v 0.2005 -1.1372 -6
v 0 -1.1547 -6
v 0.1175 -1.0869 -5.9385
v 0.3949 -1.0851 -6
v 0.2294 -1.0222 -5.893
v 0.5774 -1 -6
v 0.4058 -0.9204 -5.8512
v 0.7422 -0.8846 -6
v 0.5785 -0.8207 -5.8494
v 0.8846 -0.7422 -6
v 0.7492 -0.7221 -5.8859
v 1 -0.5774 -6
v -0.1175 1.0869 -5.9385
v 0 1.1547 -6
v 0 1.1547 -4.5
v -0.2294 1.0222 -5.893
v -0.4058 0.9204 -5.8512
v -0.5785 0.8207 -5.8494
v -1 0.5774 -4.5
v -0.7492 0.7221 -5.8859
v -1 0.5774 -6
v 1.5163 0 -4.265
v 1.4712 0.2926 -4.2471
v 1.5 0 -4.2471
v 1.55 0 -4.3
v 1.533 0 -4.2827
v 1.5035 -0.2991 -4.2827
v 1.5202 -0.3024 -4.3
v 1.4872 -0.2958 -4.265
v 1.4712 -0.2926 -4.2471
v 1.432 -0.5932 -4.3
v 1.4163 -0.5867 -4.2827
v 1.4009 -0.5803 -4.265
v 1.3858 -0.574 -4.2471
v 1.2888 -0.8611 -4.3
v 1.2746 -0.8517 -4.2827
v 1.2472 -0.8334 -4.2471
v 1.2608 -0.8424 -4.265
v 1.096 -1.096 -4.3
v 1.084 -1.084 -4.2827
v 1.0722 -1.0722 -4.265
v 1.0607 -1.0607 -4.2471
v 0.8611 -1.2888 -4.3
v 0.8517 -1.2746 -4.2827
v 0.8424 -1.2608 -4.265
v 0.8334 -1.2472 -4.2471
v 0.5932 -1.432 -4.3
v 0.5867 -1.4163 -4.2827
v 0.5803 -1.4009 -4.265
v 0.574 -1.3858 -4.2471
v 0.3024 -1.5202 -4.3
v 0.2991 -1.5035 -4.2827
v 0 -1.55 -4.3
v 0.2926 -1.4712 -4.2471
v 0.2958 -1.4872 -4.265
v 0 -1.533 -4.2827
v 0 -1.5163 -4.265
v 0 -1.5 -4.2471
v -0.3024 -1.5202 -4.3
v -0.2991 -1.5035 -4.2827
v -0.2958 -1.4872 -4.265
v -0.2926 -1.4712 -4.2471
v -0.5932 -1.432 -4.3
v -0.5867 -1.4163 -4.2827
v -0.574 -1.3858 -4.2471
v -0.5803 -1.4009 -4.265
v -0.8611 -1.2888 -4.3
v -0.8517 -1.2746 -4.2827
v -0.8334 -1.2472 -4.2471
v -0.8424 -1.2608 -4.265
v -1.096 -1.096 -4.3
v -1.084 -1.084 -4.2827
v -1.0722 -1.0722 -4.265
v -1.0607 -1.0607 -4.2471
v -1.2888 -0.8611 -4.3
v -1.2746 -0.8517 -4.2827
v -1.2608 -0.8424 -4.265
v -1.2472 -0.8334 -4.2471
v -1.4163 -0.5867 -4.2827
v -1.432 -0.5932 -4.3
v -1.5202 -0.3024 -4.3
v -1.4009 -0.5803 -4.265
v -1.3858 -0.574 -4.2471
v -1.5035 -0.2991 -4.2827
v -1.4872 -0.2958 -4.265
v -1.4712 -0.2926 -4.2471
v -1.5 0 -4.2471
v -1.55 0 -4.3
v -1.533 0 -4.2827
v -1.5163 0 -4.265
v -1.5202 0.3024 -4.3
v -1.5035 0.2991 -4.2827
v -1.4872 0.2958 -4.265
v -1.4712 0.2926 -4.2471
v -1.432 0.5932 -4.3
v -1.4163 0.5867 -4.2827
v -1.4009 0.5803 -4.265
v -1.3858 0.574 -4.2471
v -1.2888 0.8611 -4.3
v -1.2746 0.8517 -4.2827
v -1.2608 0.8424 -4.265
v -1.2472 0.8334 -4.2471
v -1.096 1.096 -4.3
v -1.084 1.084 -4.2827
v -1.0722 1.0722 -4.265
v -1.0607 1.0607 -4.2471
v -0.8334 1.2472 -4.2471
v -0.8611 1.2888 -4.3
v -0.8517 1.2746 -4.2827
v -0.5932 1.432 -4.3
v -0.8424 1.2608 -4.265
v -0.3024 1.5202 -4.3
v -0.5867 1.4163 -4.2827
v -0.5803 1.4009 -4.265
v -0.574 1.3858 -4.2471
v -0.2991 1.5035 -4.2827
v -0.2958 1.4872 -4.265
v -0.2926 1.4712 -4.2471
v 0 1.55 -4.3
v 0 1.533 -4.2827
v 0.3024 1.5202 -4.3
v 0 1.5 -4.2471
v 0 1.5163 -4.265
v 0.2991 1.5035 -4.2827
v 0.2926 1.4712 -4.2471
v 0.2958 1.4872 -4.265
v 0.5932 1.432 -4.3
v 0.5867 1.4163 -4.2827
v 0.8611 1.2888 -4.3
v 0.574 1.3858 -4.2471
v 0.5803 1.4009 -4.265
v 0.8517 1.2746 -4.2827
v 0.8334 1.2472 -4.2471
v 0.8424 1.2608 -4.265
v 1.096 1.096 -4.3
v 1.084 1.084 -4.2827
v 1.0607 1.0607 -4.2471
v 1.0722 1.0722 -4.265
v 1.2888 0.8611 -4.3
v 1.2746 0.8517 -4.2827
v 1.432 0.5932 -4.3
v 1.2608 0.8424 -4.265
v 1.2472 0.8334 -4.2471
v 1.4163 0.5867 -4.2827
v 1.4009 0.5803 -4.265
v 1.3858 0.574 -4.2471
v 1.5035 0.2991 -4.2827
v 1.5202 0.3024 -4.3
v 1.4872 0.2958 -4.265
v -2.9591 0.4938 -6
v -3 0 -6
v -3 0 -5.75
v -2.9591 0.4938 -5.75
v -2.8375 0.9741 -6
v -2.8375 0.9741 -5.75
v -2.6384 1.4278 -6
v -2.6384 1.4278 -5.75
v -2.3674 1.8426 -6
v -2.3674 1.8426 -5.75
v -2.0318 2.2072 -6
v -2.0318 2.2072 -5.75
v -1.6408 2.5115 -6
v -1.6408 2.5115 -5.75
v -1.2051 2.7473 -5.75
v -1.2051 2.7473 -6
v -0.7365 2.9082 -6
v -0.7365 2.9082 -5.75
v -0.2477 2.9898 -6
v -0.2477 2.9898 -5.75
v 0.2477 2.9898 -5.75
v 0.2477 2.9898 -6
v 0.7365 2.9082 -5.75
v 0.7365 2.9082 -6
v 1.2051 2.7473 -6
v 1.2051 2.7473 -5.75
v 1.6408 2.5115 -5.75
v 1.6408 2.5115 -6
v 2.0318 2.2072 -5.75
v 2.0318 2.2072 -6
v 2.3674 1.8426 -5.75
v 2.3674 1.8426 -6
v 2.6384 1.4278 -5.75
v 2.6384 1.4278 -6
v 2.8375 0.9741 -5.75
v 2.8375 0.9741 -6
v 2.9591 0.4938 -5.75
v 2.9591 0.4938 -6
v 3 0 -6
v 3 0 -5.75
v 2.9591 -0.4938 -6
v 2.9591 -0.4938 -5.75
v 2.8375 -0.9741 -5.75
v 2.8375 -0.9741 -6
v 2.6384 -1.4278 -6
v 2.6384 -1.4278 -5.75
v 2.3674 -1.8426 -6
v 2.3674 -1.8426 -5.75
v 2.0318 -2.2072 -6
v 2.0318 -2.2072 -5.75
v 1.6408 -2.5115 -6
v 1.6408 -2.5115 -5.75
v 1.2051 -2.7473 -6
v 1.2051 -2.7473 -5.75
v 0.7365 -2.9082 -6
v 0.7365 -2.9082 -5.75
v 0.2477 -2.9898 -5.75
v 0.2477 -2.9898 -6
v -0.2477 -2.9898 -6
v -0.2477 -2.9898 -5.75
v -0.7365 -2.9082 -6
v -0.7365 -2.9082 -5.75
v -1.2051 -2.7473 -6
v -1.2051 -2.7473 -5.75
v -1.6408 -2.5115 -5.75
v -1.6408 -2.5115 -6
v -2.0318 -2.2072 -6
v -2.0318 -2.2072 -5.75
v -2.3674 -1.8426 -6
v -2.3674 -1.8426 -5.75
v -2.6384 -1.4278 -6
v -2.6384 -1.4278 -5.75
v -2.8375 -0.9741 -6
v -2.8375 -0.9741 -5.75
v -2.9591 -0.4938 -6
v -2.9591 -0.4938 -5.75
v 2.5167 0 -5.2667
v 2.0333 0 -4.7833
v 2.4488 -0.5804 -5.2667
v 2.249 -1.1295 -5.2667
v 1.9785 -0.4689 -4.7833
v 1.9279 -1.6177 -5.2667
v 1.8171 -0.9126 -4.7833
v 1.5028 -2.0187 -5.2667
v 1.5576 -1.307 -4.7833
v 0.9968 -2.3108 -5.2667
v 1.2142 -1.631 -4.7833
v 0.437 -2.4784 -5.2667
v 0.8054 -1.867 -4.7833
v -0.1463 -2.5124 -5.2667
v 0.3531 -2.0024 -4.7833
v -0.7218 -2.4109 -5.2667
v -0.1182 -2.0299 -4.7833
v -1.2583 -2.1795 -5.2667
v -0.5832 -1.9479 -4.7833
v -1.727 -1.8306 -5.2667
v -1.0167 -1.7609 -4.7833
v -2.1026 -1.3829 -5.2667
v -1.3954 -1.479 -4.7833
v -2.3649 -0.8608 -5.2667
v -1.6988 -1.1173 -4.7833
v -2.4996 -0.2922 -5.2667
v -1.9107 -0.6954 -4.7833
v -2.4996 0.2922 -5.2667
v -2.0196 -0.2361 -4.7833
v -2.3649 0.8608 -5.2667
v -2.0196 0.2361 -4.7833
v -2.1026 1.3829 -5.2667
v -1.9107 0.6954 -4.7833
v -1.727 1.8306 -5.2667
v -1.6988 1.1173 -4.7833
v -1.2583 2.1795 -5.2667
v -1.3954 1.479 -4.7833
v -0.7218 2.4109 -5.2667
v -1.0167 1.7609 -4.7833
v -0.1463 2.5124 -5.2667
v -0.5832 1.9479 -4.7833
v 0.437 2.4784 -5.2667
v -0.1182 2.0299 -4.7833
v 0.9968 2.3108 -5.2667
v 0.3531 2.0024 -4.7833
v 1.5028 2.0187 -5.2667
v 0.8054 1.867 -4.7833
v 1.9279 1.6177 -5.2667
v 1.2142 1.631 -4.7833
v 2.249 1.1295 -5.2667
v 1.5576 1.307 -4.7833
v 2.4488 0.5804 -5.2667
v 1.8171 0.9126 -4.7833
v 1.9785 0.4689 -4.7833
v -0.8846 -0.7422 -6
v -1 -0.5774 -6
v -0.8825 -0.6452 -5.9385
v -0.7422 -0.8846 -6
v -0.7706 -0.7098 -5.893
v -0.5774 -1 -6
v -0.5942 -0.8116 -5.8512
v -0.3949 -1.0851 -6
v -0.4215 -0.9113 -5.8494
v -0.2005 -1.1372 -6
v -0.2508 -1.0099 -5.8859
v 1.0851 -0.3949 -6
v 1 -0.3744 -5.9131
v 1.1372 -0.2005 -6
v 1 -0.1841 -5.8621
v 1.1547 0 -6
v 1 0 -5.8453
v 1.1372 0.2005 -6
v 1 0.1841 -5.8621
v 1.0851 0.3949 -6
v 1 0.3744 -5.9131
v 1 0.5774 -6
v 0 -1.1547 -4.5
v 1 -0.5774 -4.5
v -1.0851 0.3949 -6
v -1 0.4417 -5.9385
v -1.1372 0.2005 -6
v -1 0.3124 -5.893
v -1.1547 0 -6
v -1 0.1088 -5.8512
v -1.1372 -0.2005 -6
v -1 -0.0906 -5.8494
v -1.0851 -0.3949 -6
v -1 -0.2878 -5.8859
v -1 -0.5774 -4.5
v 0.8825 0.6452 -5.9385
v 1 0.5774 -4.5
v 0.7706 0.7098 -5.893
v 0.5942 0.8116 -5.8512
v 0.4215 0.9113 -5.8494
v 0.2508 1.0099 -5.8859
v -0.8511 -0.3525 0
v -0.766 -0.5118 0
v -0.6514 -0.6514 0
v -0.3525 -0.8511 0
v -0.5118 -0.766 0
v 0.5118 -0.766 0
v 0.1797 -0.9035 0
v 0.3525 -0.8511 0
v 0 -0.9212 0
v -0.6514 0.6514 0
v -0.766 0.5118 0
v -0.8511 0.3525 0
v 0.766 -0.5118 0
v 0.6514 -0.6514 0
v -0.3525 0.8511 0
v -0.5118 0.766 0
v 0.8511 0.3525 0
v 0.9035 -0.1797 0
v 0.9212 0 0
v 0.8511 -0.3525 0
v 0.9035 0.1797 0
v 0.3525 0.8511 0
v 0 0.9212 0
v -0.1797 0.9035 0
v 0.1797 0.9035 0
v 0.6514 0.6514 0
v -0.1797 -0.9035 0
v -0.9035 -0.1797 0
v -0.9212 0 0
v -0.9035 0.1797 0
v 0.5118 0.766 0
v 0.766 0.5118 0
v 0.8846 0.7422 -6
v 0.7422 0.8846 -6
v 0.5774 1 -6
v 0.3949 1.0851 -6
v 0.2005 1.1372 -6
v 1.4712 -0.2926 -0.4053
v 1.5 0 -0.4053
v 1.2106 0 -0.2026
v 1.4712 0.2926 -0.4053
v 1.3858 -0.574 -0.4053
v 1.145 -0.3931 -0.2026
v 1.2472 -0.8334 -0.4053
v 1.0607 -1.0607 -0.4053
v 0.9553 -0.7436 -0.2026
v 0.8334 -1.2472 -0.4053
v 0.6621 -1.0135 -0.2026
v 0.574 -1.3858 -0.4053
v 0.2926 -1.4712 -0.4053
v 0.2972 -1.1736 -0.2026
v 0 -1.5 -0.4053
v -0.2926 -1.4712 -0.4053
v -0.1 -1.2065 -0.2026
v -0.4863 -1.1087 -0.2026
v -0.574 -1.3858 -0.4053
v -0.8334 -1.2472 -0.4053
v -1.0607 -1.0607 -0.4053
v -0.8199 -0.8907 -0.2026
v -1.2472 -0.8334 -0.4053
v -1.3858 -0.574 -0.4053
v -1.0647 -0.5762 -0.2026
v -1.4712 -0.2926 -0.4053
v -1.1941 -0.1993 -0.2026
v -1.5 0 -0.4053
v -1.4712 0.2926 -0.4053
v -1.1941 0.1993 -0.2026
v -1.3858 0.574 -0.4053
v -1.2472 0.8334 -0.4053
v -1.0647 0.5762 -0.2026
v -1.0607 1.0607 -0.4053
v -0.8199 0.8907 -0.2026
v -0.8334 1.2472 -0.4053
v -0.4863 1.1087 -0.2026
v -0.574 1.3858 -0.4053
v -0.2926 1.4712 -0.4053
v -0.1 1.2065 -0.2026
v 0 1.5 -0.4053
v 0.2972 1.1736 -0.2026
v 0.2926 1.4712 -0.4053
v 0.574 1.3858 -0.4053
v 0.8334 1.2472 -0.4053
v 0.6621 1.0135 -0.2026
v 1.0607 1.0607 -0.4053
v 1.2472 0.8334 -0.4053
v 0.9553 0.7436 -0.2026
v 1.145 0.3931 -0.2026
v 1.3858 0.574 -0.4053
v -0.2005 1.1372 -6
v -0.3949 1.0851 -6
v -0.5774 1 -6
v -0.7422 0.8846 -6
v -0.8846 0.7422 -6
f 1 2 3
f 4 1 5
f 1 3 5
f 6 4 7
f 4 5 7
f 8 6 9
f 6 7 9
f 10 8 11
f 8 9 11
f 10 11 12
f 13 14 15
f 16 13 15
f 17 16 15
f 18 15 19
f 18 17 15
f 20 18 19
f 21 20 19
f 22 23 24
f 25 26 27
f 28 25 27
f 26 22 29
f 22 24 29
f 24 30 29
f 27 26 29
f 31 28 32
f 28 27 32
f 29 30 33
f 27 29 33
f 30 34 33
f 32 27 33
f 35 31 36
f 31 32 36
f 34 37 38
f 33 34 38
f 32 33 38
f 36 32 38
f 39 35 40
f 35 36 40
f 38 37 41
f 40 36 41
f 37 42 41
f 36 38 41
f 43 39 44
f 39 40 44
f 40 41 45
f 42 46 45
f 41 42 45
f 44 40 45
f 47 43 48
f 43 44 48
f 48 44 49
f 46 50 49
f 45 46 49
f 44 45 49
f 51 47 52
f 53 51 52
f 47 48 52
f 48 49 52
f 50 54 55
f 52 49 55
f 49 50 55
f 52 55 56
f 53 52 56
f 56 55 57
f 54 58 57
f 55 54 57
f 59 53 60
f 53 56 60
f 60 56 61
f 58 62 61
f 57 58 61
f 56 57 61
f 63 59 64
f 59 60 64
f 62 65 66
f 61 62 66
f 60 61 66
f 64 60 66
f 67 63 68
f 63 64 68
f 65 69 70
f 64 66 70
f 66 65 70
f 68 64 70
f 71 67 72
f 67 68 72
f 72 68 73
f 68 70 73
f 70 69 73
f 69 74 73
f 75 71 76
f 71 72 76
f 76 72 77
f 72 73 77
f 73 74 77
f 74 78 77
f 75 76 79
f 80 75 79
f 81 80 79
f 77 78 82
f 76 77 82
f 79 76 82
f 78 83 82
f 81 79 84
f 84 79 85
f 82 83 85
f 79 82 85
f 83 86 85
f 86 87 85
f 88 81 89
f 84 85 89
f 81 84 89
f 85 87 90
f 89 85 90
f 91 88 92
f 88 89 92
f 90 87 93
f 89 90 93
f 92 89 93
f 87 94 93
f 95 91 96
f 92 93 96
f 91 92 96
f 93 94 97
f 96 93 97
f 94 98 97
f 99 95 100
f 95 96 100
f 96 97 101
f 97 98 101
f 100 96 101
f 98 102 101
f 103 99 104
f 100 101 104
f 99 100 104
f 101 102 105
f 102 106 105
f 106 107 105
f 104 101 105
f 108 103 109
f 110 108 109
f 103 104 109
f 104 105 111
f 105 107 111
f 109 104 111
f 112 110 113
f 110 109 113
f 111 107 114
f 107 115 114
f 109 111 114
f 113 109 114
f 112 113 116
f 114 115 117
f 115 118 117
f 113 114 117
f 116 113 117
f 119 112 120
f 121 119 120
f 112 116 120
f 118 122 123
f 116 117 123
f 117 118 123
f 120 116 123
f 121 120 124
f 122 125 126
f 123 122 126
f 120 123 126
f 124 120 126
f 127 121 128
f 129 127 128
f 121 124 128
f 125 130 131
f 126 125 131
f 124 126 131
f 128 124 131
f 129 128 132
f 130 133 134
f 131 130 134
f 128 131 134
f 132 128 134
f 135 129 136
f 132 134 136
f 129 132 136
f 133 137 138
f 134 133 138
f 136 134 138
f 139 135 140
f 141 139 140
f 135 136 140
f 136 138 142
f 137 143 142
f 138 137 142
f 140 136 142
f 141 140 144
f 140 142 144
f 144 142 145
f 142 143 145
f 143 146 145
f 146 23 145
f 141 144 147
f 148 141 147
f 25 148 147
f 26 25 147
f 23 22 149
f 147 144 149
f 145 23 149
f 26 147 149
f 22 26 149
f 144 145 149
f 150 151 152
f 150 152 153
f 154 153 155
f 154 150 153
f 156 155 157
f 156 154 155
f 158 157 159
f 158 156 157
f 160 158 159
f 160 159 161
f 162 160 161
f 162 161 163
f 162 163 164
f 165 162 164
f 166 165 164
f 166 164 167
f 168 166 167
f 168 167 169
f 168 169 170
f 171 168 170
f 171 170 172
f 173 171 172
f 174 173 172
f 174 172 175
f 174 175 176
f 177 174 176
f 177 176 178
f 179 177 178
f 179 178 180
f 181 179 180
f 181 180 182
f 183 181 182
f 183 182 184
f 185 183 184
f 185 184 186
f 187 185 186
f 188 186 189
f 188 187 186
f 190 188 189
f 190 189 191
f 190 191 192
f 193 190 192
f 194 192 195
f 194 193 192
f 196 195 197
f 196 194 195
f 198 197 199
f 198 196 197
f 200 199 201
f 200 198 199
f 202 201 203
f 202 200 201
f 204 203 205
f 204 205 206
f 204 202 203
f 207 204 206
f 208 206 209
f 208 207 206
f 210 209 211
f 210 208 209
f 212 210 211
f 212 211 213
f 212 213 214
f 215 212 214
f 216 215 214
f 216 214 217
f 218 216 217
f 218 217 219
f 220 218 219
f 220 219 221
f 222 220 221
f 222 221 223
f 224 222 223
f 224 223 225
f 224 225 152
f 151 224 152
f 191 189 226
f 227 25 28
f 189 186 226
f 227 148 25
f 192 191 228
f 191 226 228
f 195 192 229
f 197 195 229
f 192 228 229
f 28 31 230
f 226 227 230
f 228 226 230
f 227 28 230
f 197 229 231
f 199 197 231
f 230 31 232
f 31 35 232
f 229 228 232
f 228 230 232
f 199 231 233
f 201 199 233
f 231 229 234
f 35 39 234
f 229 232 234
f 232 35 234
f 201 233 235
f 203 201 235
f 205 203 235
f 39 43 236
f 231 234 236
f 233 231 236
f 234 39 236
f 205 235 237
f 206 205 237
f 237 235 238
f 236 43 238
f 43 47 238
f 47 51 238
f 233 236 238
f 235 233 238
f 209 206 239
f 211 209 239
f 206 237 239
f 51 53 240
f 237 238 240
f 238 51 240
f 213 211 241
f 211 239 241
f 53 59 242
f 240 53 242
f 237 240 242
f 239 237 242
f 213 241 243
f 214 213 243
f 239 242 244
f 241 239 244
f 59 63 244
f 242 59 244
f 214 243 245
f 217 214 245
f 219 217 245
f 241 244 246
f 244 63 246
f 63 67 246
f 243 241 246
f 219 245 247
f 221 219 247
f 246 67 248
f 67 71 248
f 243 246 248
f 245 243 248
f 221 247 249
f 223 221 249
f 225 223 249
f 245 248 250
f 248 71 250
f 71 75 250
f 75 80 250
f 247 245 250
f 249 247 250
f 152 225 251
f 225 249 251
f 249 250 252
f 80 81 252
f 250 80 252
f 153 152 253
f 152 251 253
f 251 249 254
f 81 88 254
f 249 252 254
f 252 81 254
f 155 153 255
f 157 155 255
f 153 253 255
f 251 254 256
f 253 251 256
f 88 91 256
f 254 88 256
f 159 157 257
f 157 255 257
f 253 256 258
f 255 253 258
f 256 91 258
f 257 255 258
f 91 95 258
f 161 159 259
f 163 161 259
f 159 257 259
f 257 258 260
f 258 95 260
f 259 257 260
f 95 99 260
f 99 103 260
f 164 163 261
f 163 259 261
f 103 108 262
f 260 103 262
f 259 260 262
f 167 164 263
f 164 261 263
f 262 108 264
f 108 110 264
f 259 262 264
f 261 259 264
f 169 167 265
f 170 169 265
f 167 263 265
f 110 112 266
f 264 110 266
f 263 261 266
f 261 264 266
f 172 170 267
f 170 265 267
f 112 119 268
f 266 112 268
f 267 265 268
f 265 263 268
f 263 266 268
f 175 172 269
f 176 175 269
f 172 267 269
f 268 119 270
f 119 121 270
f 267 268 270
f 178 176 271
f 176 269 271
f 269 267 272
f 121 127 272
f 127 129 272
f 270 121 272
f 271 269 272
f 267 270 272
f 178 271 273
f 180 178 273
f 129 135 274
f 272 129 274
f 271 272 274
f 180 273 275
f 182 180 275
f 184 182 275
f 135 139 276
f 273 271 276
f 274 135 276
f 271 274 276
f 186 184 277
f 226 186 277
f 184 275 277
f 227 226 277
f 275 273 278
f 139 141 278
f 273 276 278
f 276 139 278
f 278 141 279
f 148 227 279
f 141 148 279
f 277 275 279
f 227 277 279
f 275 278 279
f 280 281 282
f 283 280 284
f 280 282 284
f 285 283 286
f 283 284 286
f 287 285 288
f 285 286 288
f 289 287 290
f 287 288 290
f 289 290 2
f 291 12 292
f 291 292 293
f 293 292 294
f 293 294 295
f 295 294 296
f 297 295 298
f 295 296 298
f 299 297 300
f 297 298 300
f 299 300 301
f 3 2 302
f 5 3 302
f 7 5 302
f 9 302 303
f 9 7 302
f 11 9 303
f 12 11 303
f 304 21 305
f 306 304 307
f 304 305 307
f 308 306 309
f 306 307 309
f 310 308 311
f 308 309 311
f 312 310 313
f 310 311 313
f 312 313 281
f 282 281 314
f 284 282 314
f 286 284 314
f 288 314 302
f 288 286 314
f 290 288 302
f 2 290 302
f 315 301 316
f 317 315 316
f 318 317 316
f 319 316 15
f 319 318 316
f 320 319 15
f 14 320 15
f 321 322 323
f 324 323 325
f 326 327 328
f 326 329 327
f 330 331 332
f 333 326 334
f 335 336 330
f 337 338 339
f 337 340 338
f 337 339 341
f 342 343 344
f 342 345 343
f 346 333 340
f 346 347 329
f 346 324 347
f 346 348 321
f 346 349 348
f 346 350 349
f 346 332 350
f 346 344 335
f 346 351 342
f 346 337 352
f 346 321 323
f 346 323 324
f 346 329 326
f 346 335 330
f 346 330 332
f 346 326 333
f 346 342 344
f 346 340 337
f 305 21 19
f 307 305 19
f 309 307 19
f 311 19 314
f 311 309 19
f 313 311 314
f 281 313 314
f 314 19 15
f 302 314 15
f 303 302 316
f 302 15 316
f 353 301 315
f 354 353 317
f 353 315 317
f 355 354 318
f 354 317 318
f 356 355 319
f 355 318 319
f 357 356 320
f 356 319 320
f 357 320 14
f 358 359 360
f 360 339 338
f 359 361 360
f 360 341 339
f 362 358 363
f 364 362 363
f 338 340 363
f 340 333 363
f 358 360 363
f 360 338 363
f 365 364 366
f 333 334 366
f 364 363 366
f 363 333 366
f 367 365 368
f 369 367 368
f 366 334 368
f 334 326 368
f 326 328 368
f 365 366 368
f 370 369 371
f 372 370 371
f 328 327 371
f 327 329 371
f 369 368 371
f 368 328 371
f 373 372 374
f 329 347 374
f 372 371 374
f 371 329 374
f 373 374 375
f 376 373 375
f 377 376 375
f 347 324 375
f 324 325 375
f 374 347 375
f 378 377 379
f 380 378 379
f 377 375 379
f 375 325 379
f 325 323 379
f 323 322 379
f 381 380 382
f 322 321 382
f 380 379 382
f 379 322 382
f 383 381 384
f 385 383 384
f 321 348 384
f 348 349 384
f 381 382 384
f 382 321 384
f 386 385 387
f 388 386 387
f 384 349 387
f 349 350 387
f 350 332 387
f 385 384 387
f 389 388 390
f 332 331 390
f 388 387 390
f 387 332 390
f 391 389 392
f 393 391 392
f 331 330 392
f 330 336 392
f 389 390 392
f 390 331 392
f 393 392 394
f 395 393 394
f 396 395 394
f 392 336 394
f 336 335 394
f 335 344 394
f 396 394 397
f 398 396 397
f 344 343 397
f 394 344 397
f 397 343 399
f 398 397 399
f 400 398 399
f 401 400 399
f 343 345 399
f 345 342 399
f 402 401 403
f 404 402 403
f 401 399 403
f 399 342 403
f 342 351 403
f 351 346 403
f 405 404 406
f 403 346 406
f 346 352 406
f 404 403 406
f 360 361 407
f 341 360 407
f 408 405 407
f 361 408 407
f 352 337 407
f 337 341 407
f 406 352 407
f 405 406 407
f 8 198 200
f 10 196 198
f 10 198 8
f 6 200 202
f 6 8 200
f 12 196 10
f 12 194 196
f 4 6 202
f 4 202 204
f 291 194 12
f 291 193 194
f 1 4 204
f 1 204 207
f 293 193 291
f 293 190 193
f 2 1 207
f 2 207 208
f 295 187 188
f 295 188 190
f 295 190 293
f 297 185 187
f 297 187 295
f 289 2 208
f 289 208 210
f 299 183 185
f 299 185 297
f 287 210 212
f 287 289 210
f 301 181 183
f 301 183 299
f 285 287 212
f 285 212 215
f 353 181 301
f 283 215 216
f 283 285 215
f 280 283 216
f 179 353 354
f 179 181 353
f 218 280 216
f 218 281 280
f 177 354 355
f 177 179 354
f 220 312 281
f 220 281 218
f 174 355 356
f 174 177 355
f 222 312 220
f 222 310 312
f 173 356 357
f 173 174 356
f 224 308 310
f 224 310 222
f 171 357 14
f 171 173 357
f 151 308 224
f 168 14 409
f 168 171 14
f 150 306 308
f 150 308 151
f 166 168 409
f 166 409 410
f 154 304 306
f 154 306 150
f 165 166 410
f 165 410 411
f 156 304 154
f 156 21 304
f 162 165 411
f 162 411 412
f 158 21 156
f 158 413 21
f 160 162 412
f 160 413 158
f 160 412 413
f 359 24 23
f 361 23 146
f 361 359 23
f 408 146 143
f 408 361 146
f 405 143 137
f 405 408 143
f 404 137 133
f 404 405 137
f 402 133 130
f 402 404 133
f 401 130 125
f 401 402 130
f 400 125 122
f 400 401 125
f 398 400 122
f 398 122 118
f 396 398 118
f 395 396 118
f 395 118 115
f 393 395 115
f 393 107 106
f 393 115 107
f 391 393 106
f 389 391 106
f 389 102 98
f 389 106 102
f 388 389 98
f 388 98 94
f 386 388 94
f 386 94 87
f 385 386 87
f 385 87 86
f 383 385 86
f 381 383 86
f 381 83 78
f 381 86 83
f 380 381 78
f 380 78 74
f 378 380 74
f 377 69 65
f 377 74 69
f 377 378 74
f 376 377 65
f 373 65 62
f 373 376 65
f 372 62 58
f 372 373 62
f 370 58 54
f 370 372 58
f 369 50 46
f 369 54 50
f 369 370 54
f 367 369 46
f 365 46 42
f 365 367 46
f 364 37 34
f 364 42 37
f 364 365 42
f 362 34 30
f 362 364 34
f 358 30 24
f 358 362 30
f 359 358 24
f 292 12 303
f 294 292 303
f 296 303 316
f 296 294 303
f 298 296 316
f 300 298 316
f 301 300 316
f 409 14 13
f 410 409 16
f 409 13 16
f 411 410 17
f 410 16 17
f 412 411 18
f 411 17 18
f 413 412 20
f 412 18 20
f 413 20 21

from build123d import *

# Parameters (mm, degrees)
SKETCH1_R          = 1.5
EXTRUDE1_DEPTH     = 6
SKETCH6_R          = 3
EXTRUDE2_DEPTH     = 1.7
CUT_EXTRUDE1_DEPTH = 1.5
SKETCH8_R          = 1.154700538
CUT_EXTRUDE2_DEPTH = 7
CUT_EXTRUDE2_TAPER = 45


with BuildPart() as part:
    # Sketch1 → Extrude1 (new body)
    with BuildSketch(Plane.XY):
        Circle(SKETCH1_R)
    extrude(amount=-EXTRUDE1_DEPTH)

    # Sketch4 → Cut-Revolve1 (revolve, cut)
    with BuildSketch(Plane(origin=(0, 0, 0), x_dir=(0, 0, -1), z_dir=(1, 0, 0)), mode=Mode.PRIVATE) as cut_revolve1_sk:
        Polygon((0.405251783, 1.5), (0, 0.921240474), (0, 1.5), align=None)
    revolve(cut_revolve1_sk.sketch.rotate(Axis((0, 0, 0), (0, 0, -1)), 90), axis=Axis((0, 0, 0), (0, 0, -1)), mode=Mode.SUBTRACT)  # turned: the seam where the file's is

    # Sketch6 → Extrude2 (add)
    with BuildSketch(Plane(origin=(0, 0, -6), x_dir=(-1, 0, 0), z_dir=(0, 0, -1))):
        Circle(SKETCH6_R)
    extrude(amount=-EXTRUDE2_DEPTH)

    # Sketch10 → Cut-Revolve2 (revolve, cut)
    with BuildSketch(Plane(origin=(0, 0, 0), x_dir=(0, 0, -1), z_dir=(1, 0, 0)), mode=Mode.PRIVATE) as cut_revolve2_sk:
        Polygon((5.75, -3), (4.3, -1.55), (4.3, -3), align=None)
    revolve(cut_revolve2_sk.sketch.rotate(Axis((0, 0, 0), (0, 0, -1)), 270), axis=Axis((0, 0, 0), (0, 0, -1)), mode=Mode.SUBTRACT)  # turned: the seam where the file's is

    # Sketch11 → Revolve1 (revolve)
    with BuildSketch(Plane(origin=(0, 0, 0), x_dir=(0, 0, -1), z_dir=(1, 0, 0)), mode=Mode.PRIVATE) as revolve1_sk:
        with BuildLine():
            Line((3.395250469, 1.175240474), (3.395250469, 0))
            Line((3.395250469, 0), (4.3, 0))
            Line((4.3, 0), (4.3, 1.55))
            ThreePointArc((4.3, 1.55), (3.884897387, 1.272637301), (3.395250469, 1.175240474))
        make_face()
    revolve(revolve1_sk.sketch.rotate(Axis((0, 0, 0), (0, 0, -1)), 90), axis=Axis((0, 0, 0), (0, 0, -1)))  # turned: the seam where the file's is

    # Sketch7 → Cut-Extrude1 (cut)
    with BuildSketch(Plane.XY.offset(-6)):
        Polygon((0, 1.154700538), (-1, 0.577350269), (-1, -0.577350269), (0, -1.154700538), (1, -0.577350269), (1, 0.577350269), align=None)
    extrude(amount=CUT_EXTRUDE1_DEPTH, mode=Mode.SUBTRACT)

    # Sketch8 → Cut-Extrude2 (cut, through all)
    with BuildSketch(Plane.XY.offset(-6)):
        Circle(SKETCH8_R)
    extrude(amount=CUT_EXTRUDE2_DEPTH, taper=CUT_EXTRUDE2_TAPER, mode=Mode.SUBTRACT)


solid = part.part
